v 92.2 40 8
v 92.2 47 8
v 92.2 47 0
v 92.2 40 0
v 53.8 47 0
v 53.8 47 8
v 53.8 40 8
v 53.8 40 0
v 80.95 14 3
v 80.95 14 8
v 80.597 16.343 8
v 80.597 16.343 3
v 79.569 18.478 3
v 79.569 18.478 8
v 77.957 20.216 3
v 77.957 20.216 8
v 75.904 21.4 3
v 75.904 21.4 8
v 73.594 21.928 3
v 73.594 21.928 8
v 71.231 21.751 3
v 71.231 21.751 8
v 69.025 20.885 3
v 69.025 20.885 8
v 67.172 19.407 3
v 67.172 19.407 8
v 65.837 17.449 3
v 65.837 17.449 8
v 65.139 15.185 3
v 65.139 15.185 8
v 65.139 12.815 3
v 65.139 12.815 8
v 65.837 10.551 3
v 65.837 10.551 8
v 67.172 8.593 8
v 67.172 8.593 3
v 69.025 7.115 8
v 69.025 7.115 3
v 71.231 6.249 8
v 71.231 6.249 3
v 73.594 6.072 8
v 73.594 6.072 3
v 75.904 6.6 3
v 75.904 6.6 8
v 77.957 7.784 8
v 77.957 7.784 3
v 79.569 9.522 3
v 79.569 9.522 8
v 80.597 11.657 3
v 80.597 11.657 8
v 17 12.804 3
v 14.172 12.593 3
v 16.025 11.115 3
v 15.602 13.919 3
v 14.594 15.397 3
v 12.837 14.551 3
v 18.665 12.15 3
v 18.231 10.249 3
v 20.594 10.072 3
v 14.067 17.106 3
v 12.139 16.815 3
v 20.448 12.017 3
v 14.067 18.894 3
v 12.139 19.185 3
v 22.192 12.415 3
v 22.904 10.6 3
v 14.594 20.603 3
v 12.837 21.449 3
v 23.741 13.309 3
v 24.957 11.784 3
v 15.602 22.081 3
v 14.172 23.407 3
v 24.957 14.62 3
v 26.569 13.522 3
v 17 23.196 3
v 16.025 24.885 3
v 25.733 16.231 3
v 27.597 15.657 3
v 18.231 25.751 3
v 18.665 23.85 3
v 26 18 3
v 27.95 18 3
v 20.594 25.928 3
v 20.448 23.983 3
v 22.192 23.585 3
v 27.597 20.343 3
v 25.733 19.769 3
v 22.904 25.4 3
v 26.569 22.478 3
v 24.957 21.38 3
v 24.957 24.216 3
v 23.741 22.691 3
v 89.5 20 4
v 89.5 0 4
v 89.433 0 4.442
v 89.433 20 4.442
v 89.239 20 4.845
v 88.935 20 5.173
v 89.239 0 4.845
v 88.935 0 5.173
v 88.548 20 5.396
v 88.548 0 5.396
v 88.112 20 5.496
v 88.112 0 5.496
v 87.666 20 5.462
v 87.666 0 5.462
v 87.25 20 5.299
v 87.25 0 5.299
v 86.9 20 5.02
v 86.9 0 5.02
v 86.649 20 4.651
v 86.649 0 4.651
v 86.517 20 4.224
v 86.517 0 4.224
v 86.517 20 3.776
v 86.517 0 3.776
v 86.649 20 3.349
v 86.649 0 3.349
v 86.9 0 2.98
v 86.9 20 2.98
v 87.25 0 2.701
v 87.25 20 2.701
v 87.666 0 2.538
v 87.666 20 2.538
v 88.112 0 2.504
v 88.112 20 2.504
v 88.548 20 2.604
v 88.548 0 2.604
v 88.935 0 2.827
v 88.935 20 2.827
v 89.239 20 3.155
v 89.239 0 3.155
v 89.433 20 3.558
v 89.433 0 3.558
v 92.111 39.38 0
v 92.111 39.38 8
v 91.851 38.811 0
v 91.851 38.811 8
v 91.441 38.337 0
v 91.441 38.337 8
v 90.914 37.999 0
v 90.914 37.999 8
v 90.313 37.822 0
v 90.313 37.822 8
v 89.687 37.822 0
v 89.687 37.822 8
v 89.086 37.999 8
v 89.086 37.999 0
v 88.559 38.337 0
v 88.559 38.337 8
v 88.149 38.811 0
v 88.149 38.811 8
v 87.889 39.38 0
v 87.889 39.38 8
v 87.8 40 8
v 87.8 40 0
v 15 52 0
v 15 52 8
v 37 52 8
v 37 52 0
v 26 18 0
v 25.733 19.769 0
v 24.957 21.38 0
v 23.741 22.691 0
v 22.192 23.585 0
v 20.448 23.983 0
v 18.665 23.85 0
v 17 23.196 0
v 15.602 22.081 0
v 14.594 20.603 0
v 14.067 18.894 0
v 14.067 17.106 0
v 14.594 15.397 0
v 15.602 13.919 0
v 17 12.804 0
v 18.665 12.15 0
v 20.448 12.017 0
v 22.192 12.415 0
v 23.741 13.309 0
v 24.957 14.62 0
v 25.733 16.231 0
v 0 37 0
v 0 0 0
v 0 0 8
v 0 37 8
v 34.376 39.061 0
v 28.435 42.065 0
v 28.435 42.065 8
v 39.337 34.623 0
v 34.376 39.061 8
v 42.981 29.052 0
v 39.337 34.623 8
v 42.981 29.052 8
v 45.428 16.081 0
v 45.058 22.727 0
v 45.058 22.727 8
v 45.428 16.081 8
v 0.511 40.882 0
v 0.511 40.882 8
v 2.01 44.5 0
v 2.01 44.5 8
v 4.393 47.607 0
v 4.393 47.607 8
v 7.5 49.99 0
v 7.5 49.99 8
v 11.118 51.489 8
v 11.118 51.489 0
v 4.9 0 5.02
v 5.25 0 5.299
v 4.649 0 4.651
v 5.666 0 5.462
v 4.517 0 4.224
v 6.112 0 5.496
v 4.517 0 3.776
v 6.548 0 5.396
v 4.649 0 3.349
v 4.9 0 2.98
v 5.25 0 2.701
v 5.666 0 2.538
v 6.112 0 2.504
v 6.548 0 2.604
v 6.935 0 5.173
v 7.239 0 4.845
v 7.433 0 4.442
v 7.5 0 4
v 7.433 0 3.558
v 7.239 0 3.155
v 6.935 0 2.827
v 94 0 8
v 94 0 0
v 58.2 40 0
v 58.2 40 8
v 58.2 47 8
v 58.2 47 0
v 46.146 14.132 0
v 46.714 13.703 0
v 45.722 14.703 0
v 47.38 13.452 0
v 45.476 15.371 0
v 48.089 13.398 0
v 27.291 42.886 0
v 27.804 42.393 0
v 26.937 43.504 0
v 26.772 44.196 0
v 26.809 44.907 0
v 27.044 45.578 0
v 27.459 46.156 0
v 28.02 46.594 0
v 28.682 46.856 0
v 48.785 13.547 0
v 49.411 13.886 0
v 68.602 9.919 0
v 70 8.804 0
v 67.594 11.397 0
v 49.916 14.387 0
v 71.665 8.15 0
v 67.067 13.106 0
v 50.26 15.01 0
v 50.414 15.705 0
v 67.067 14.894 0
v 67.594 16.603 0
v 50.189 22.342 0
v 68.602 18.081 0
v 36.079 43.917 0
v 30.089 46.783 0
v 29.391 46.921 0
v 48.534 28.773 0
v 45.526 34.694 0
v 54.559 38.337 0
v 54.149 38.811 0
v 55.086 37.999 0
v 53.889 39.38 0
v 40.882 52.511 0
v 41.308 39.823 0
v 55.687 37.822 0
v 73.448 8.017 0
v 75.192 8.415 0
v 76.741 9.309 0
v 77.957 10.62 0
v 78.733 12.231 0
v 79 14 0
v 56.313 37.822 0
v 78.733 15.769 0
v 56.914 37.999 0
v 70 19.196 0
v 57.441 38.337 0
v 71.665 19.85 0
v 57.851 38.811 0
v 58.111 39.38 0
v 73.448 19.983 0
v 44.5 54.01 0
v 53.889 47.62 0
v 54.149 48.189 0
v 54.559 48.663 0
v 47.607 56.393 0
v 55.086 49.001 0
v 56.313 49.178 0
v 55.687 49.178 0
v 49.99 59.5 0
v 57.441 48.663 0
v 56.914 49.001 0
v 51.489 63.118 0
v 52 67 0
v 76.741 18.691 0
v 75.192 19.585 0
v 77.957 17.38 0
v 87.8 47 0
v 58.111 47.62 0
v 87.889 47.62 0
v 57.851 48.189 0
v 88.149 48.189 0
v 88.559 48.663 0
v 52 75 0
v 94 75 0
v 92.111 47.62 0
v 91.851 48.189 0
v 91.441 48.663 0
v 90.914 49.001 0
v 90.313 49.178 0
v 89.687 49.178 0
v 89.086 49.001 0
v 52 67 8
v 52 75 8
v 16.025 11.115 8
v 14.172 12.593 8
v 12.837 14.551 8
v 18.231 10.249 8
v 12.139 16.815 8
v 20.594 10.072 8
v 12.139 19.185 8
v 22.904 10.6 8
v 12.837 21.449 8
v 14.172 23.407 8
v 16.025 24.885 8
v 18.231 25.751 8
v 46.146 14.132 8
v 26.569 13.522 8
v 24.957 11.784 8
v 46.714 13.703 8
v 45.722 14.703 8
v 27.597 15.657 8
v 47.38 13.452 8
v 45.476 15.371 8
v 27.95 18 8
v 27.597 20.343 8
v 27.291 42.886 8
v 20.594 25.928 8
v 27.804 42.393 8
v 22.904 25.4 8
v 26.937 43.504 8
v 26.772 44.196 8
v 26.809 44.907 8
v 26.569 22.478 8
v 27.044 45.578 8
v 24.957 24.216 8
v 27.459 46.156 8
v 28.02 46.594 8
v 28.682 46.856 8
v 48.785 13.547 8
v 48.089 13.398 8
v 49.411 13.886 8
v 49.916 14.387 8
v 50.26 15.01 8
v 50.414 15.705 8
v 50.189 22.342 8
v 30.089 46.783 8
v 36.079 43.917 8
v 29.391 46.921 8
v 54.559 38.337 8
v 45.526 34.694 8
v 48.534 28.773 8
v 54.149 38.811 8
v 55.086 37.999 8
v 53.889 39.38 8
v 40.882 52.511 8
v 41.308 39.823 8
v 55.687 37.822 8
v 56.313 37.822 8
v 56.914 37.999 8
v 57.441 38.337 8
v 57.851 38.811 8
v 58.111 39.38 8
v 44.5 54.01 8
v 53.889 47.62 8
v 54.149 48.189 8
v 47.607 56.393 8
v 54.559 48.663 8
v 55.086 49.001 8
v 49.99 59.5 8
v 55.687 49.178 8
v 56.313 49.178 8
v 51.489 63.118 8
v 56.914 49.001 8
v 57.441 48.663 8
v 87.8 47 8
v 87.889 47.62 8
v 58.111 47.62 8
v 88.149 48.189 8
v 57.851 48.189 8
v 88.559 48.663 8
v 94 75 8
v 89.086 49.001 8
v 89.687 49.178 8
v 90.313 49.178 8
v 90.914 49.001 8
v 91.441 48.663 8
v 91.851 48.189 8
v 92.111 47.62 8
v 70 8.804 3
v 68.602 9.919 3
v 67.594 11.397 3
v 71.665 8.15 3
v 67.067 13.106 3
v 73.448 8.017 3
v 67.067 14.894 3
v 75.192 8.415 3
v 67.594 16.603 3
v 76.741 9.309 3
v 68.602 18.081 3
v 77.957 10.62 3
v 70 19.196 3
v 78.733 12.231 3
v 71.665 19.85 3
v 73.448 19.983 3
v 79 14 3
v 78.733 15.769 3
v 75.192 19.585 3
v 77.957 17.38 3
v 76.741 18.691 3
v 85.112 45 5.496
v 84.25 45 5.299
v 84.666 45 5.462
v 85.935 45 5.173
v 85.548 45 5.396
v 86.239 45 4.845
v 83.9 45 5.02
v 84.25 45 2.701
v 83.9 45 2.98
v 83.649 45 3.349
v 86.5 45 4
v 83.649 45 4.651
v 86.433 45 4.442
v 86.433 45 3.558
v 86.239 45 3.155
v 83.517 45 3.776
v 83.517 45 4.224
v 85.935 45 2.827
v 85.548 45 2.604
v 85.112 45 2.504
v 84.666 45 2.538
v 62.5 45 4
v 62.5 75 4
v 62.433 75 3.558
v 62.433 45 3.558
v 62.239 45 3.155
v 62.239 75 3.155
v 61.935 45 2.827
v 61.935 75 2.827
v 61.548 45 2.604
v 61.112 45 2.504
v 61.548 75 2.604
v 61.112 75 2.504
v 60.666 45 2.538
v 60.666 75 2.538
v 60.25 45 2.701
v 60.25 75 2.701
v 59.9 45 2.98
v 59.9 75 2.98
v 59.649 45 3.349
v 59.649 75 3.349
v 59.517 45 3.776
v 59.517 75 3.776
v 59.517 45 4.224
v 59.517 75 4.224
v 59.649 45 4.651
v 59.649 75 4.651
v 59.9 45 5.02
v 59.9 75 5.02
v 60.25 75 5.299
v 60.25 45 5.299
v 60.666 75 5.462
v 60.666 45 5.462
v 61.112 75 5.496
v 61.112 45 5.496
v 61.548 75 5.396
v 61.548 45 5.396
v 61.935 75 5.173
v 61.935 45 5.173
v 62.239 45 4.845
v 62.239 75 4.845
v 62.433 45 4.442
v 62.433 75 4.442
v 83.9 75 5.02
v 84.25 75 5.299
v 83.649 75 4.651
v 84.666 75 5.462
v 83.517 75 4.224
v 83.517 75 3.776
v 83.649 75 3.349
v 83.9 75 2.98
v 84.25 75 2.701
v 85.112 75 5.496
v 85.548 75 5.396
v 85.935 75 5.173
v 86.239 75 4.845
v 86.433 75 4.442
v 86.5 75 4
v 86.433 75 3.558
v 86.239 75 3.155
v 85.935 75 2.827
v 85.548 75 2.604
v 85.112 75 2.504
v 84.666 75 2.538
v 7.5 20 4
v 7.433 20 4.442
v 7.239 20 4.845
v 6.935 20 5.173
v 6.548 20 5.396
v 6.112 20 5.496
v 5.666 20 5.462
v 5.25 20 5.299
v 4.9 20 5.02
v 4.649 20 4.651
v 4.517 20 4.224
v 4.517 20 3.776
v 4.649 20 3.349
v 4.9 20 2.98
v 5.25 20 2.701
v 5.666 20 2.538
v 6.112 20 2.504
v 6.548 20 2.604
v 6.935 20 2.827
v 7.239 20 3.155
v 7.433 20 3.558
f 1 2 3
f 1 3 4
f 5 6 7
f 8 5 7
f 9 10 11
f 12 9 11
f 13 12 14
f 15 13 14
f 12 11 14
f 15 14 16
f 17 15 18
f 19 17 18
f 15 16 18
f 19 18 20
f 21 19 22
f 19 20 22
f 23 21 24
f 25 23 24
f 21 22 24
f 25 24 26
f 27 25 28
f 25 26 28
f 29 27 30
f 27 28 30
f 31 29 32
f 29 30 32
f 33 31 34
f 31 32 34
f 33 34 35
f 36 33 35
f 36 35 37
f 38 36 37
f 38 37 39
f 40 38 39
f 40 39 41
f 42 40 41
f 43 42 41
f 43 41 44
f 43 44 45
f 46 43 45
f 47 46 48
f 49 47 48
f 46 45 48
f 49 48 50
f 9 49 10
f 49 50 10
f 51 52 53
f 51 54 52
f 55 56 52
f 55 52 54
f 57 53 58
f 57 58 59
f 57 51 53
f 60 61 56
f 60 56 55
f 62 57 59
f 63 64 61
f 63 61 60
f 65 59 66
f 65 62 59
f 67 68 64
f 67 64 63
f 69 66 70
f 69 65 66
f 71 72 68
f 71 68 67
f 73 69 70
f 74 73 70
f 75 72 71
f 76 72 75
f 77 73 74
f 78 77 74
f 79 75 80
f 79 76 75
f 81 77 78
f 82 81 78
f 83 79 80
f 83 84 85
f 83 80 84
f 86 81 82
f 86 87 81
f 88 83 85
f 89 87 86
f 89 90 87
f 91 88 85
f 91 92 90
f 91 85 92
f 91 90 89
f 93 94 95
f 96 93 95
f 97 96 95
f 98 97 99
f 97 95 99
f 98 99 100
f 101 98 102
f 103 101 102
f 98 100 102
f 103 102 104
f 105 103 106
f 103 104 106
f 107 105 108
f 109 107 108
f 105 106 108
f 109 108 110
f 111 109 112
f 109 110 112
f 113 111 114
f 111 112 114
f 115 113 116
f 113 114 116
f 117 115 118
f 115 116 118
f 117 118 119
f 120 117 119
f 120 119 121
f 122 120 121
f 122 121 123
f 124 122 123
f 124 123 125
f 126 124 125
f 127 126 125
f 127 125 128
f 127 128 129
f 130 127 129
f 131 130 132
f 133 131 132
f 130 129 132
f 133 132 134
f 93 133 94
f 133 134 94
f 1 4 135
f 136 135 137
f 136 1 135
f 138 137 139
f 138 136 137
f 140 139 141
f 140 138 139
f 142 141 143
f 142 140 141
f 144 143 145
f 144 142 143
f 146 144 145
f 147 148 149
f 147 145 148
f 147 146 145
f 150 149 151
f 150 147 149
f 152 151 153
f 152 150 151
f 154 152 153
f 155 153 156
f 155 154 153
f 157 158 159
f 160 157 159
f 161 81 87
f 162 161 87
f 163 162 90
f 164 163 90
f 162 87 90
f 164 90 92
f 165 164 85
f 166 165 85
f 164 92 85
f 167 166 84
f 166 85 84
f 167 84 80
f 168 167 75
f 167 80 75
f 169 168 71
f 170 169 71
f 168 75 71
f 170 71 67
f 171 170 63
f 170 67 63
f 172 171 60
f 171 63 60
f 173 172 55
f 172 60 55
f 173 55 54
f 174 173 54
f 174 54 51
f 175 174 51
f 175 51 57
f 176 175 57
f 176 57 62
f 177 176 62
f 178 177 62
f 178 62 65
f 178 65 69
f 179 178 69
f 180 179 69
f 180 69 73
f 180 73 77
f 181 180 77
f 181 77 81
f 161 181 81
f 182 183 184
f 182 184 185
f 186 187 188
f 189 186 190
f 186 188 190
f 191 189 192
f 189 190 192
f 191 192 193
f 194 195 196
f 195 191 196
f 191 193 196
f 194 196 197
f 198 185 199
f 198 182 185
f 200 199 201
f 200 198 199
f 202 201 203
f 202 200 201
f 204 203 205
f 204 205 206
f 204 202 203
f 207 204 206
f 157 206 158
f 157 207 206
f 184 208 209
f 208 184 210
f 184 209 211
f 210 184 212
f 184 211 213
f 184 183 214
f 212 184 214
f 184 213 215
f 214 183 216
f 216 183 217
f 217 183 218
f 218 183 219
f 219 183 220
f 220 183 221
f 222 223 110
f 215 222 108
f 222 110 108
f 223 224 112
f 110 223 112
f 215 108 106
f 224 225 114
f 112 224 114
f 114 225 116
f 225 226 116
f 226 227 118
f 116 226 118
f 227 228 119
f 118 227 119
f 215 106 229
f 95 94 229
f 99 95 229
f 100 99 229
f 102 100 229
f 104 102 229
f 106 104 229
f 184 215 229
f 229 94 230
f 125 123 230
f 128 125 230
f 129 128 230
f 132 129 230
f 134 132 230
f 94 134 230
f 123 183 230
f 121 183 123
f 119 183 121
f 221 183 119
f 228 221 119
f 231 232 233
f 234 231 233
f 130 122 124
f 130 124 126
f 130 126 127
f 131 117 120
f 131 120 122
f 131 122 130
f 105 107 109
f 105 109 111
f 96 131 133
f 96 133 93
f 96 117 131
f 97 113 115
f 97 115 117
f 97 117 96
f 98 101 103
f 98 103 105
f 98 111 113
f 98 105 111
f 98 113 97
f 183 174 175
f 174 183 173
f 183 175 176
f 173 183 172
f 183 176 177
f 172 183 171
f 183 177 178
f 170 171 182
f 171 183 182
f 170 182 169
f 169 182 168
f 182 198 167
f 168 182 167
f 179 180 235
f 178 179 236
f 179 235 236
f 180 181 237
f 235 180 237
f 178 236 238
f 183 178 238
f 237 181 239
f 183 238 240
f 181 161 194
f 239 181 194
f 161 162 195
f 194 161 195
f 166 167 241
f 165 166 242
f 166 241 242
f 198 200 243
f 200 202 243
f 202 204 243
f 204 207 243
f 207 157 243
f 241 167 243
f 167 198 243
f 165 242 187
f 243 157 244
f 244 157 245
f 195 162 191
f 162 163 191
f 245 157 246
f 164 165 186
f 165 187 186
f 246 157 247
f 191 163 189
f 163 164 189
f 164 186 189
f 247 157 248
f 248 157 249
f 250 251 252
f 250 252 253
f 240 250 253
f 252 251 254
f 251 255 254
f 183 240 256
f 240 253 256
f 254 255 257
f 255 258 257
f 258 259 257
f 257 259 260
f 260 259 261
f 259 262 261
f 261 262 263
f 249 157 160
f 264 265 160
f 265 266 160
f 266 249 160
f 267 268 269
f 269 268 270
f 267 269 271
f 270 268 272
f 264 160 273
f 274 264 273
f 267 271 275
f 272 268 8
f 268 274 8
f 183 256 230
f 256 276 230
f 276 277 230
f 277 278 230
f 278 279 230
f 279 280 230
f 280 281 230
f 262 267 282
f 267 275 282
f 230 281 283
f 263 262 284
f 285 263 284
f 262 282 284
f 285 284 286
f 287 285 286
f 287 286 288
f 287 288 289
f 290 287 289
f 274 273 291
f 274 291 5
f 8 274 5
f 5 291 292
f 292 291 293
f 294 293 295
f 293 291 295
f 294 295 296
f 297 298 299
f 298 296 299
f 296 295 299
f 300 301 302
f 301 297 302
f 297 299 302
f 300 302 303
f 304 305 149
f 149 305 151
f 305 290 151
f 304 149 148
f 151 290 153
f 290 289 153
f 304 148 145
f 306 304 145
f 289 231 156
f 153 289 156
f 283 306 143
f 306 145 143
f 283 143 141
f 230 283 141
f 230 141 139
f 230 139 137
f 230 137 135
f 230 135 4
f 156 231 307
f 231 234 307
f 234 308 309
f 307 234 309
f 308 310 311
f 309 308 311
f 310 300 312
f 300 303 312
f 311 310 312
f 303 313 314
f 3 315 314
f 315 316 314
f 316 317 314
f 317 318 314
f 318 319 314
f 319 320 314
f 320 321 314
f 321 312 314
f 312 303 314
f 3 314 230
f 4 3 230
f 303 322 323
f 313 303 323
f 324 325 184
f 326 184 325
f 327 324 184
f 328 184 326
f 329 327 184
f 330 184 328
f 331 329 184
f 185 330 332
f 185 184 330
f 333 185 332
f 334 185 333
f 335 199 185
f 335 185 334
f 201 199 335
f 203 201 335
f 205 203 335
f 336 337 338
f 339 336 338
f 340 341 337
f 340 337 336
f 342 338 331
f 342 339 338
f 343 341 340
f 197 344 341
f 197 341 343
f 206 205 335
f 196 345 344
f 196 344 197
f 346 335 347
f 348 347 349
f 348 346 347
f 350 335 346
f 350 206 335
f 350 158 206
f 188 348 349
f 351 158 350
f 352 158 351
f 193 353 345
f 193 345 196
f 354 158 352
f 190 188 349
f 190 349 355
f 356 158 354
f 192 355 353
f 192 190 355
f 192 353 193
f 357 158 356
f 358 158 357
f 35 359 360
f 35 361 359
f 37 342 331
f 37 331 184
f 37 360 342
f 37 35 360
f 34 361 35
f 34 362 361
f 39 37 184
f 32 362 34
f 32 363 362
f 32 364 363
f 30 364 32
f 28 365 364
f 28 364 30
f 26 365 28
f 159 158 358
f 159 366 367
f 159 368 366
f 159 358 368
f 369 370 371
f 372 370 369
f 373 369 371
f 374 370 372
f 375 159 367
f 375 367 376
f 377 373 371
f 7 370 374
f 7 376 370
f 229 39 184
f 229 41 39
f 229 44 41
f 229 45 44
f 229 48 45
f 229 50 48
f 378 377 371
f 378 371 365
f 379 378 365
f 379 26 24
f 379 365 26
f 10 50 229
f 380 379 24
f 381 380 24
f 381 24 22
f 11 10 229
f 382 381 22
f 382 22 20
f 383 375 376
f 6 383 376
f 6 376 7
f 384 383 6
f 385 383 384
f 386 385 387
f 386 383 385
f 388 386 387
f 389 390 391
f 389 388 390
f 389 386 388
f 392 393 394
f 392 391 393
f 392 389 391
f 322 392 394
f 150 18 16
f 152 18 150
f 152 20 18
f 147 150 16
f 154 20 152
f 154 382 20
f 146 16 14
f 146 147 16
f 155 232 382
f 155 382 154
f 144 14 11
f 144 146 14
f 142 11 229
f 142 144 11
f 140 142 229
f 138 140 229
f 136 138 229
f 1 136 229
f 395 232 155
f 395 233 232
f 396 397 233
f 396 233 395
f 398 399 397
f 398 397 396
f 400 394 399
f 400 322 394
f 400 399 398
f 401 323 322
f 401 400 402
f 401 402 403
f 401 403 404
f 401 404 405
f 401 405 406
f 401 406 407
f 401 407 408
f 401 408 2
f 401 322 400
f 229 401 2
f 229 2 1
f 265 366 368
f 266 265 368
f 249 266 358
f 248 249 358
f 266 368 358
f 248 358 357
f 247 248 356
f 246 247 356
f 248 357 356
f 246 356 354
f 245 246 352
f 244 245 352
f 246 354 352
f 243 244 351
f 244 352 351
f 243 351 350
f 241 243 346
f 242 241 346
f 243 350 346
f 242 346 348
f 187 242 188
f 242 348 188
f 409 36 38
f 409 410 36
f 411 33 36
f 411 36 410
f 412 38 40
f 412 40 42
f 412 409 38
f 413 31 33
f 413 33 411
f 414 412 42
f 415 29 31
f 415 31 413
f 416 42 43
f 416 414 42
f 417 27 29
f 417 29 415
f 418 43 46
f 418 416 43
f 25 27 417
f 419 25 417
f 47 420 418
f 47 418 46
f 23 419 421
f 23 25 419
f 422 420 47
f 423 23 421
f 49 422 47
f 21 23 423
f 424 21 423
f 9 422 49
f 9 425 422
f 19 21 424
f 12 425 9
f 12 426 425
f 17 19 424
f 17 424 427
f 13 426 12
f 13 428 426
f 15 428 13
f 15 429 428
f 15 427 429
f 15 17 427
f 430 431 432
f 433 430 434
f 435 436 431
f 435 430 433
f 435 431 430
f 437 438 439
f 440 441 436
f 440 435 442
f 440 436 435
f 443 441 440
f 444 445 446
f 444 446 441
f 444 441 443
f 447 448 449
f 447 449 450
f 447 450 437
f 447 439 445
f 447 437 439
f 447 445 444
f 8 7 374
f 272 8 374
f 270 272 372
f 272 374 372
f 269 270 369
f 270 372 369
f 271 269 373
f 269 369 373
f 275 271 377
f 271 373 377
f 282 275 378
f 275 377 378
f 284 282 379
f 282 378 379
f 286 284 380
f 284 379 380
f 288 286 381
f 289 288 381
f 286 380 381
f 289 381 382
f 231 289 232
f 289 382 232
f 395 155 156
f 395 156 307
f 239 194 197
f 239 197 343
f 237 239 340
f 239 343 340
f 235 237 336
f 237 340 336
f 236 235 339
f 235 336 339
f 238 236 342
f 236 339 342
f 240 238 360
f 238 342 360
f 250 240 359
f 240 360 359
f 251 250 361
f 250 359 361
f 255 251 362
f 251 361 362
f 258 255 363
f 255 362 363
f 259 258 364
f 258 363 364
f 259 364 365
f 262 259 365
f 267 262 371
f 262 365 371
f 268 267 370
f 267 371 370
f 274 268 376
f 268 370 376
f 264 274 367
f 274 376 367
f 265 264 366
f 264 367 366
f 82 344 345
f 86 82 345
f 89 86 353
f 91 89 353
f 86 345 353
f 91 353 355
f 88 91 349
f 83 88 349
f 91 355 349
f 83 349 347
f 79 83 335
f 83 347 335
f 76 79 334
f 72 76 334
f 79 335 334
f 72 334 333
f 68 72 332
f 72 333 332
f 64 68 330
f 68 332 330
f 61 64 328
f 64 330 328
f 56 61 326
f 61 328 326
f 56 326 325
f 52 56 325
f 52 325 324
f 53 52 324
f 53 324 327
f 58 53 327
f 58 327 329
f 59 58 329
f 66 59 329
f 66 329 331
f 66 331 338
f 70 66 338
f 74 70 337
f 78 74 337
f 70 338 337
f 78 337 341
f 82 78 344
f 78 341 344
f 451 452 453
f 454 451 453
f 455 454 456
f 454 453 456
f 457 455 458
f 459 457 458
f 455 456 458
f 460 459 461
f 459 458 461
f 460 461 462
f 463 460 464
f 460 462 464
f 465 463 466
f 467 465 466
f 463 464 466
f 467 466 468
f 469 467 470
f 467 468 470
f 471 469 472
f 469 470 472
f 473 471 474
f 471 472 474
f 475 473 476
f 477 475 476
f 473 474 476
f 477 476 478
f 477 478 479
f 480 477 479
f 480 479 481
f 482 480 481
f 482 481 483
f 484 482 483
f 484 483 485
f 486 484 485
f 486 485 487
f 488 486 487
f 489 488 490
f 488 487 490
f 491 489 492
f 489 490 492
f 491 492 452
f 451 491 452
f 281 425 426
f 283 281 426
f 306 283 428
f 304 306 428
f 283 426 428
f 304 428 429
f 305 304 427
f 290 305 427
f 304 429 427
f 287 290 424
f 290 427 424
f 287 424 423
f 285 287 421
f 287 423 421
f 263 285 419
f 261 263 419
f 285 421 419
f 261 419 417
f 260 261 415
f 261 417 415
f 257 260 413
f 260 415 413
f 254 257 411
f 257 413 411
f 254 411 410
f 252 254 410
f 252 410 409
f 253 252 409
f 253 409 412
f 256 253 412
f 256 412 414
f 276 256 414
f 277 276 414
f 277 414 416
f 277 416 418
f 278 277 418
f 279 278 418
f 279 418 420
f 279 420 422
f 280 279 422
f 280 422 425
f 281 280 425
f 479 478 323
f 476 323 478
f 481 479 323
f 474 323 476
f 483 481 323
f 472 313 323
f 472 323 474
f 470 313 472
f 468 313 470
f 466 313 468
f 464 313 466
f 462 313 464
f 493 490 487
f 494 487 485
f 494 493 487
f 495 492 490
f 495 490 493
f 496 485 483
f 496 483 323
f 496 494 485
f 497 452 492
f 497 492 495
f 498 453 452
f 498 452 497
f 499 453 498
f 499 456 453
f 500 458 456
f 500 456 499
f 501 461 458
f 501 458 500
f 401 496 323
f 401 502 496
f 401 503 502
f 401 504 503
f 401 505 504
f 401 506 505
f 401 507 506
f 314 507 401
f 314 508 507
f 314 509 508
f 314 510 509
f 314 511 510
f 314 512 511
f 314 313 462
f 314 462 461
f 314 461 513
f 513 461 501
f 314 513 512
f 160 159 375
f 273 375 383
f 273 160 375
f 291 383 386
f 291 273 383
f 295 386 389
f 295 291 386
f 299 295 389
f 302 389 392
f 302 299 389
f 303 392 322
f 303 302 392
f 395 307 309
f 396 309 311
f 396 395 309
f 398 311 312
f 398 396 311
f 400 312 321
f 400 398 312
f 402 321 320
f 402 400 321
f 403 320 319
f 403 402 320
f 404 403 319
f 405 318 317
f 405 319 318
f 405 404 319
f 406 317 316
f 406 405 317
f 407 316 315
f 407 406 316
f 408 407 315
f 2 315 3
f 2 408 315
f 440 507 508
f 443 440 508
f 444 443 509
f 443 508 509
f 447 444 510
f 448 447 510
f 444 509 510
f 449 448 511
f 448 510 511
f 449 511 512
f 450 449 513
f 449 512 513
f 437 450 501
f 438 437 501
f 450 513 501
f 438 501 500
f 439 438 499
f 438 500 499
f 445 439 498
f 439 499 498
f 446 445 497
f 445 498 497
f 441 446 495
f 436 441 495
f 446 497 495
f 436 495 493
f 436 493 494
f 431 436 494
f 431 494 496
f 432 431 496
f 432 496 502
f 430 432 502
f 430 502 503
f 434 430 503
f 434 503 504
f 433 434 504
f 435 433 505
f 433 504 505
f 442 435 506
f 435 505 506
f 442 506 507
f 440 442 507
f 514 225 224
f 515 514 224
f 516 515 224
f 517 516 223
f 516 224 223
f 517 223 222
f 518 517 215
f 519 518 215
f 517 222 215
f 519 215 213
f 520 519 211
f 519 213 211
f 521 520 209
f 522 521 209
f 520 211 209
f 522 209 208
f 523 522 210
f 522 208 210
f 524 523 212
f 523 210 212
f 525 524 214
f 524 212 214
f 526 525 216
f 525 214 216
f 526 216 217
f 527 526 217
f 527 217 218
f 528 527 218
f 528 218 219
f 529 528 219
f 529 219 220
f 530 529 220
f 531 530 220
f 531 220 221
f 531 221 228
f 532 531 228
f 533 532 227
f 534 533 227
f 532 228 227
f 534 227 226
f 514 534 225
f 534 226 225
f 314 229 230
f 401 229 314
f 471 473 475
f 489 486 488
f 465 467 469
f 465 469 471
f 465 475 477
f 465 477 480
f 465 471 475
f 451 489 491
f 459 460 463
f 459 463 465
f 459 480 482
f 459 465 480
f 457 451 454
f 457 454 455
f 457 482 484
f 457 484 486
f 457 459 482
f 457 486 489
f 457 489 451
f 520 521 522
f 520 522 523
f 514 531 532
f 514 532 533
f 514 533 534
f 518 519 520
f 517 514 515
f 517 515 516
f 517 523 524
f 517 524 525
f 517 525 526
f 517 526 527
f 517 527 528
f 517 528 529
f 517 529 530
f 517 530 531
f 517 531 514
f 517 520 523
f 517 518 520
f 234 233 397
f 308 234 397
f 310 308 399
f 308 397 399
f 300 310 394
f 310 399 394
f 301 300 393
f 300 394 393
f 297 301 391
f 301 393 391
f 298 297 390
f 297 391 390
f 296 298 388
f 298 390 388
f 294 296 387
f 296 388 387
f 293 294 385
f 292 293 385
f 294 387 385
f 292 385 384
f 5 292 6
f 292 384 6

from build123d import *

# Parameters (mm, degrees)
ESQUISSE1_W             = 114.432989691
ESQUISSE1_H             = 75
BOSS_EXTRU_1_DEPTH      = 8
ESQUISSE2_R             = 7.95
ENL_V_MAT_EXTRU_1_DEPTH = 5
ENL_V_MAT_EXTRU_2_REACH = 5
ESQUISSE3_R             = 6
ENL_V_MAT_EXTRU_3_DEPTH = 9
ESQUISSE5_W             = 20.432989691
ESQUISSE5_H             = 75
ENL_V_MAT_EXTRU_4_DEPTH = 9
ENL_V_MAT_EXTRU_5_DEPTH = 9
ESQUISSE7_W             = 52
ESQUISSE7_H             = 23
ENL_V_MAT_EXTRU_6_DEPTH = 9
ESQUISSE10_R            = 1.5
ENL_V_MAT_EXTRU_7_DEPTH = 30
CONG_1_R                = 15
ESQUISSE11_R            = 1.5
ENL_V_MAT_EXTRU_8_DEPTH = 20


with BuildPart() as part:
    # Esquisse1 → Boss.-Extru.1 (new body)
    with BuildSketch(Plane.XY):
        with Locations((57.216494846, 37.5)):
            Rectangle(ESQUISSE1_W, ESQUISSE1_H)
    extrude(amount=BOSS_EXTRU_1_DEPTH)

    # Esquisse2 → Enlèv. mat.-Extru.1 (cut)
    with BuildSketch(Plane.XY.offset(8)):
        with Locations((20, 18)):
            Circle(ESQUISSE2_R)
        with Locations((73, 14)):
            Circle(ESQUISSE2_R)
    extrude(amount=-ENL_V_MAT_EXTRU_1_DEPTH, mode=Mode.SUBTRACT)

    # Esquisse3 → Enlèv. mat.-Extru.2 (cut, up to next)
    with BuildSketch(Plane.XY.offset(3), mode=Mode.PRIVATE) as enl_v_mat_extru_2_sk1:
        with Locations((20, 18)):
            Circle(ESQUISSE3_R)
    enl_v_mat_extru_2_tool1 = extrude(enl_v_mat_extru_2_sk1.sketch, amount=-ENL_V_MAT_EXTRU_2_REACH, mode=Mode.PRIVATE) & part.part
    add(enl_v_mat_extru_2_tool1.solids().sort_by_distance((20, 18, 3))[0], mode=Mode.SUBTRACT)
    # Esquisse3 → Enlèv. mat.-Extru.2 (cut, up to next)
    with BuildSketch(Plane.XY.offset(3), mode=Mode.PRIVATE) as enl_v_mat_extru_2_sk2:
        with Locations((73, 14)):
            Circle(ESQUISSE3_R)
    enl_v_mat_extru_2_tool2 = extrude(enl_v_mat_extru_2_sk2.sketch, amount=-ENL_V_MAT_EXTRU_2_REACH, mode=Mode.PRIVATE) & part.part
    add(enl_v_mat_extru_2_tool2.solids().sort_by_distance((73, 14, 3))[0], mode=Mode.SUBTRACT)

    # Esquisse4 → Enlèv. mat.-Extru.3 (cut, through all)
    with BuildSketch(Plane.XY.offset(8)):
        with BuildLine():
            ThreePointArc((50.413505675, 15.704641081), (45.525982293, 34.69353851), (30.088740957, 46.783107996))
            ThreePointArc((30.088740957, 46.783107996), (26.90252383, 45.250782829), (28.434848997, 42.064565701))
            ThreePointArc((28.434848997, 42.064565701), (41.341395032, 31.956892853), (45.427685072, 16.080929428))
            ThreePointArc((45.427685072, 16.080929428), (47.7324512, 13.399874954), (50.413505675, 15.704641081))
        make_face()
    extrude(amount=-ENL_V_MAT_EXTRU_3_DEPTH, mode=Mode.SUBTRACT)

    # Esquisse5 → Enlèv. mat.-Extru.4 (cut, through all)
    with BuildSketch(Plane.XY.offset(8)):
        with Locations((104.216494845, 37.5)):
            Rectangle(ESQUISSE5_W, ESQUISSE5_H)
    extrude(amount=-ENL_V_MAT_EXTRU_4_DEPTH, mode=Mode.SUBTRACT)

    # Esquisse6 → Enlèv. mat.-Extru.5 (cut, through all)
    with BuildSketch(Plane.XY.offset(8)):
        with BuildLine():
            Line((87.8, 40), (87.8, 47))
            ThreePointArc((87.8, 47), (90, 49.2), (92.2, 47))
            Line((92.2, 47), (92.2, 40))
            ThreePointArc((92.2, 40), (90, 37.8), (87.8, 40))
        make_face()
        with BuildLine():
            Line((58.2, 40), (58.2, 47))
            ThreePointArc((58.2, 47), (56, 49.2), (53.8, 47))
            Line((53.8, 47), (53.8, 40))
            ThreePointArc((53.8, 40), (56, 37.8), (58.2, 40))
        make_face()
    extrude(amount=-ENL_V_MAT_EXTRU_5_DEPTH, mode=Mode.SUBTRACT)

    # Esquisse7 → Enlèv. mat.-Extru.6 (cut, through all)
    with BuildSketch(Plane.XY.offset(8)):
        with Locations((26, 63.5)):
            Rectangle(ESQUISSE7_W, ESQUISSE7_H)
    extrude(amount=-ENL_V_MAT_EXTRU_6_DEPTH, mode=Mode.SUBTRACT)

    # Esquisse10 → Enlèv. mat.-Extru.7 (cut)
    with BuildSketch(Plane(origin=(0, 75, 0), x_dir=(1, 0, 0), z_dir=(0, 1, 0))):
        with Locations((85, -4)):
            Circle(ESQUISSE10_R)
        with Locations((61, -4)):
            Circle(ESQUISSE10_R)
    extrude(amount=-ENL_V_MAT_EXTRU_7_DEPTH, mode=Mode.SUBTRACT)

    # Congé1
    cong_1_edges = [part.edges().sort_by_distance(p)[0] for p in [
        (52, 52, 4),
        (0, 52, 4),
    ]]
    fillet(cong_1_edges, radius=CONG_1_R)

    # Esquisse11 → Enlèv. mat.-Extru.8 (cut)
    with BuildSketch(Plane.XZ):
        with Locations((6, 4)):
            Circle(ESQUISSE11_R)
        with Locations((88, 4)):
            Circle(ESQUISSE11_R)
    extrude(amount=-ENL_V_MAT_EXTRU_8_DEPTH, mode=Mode.SUBTRACT)


solid = part.part
